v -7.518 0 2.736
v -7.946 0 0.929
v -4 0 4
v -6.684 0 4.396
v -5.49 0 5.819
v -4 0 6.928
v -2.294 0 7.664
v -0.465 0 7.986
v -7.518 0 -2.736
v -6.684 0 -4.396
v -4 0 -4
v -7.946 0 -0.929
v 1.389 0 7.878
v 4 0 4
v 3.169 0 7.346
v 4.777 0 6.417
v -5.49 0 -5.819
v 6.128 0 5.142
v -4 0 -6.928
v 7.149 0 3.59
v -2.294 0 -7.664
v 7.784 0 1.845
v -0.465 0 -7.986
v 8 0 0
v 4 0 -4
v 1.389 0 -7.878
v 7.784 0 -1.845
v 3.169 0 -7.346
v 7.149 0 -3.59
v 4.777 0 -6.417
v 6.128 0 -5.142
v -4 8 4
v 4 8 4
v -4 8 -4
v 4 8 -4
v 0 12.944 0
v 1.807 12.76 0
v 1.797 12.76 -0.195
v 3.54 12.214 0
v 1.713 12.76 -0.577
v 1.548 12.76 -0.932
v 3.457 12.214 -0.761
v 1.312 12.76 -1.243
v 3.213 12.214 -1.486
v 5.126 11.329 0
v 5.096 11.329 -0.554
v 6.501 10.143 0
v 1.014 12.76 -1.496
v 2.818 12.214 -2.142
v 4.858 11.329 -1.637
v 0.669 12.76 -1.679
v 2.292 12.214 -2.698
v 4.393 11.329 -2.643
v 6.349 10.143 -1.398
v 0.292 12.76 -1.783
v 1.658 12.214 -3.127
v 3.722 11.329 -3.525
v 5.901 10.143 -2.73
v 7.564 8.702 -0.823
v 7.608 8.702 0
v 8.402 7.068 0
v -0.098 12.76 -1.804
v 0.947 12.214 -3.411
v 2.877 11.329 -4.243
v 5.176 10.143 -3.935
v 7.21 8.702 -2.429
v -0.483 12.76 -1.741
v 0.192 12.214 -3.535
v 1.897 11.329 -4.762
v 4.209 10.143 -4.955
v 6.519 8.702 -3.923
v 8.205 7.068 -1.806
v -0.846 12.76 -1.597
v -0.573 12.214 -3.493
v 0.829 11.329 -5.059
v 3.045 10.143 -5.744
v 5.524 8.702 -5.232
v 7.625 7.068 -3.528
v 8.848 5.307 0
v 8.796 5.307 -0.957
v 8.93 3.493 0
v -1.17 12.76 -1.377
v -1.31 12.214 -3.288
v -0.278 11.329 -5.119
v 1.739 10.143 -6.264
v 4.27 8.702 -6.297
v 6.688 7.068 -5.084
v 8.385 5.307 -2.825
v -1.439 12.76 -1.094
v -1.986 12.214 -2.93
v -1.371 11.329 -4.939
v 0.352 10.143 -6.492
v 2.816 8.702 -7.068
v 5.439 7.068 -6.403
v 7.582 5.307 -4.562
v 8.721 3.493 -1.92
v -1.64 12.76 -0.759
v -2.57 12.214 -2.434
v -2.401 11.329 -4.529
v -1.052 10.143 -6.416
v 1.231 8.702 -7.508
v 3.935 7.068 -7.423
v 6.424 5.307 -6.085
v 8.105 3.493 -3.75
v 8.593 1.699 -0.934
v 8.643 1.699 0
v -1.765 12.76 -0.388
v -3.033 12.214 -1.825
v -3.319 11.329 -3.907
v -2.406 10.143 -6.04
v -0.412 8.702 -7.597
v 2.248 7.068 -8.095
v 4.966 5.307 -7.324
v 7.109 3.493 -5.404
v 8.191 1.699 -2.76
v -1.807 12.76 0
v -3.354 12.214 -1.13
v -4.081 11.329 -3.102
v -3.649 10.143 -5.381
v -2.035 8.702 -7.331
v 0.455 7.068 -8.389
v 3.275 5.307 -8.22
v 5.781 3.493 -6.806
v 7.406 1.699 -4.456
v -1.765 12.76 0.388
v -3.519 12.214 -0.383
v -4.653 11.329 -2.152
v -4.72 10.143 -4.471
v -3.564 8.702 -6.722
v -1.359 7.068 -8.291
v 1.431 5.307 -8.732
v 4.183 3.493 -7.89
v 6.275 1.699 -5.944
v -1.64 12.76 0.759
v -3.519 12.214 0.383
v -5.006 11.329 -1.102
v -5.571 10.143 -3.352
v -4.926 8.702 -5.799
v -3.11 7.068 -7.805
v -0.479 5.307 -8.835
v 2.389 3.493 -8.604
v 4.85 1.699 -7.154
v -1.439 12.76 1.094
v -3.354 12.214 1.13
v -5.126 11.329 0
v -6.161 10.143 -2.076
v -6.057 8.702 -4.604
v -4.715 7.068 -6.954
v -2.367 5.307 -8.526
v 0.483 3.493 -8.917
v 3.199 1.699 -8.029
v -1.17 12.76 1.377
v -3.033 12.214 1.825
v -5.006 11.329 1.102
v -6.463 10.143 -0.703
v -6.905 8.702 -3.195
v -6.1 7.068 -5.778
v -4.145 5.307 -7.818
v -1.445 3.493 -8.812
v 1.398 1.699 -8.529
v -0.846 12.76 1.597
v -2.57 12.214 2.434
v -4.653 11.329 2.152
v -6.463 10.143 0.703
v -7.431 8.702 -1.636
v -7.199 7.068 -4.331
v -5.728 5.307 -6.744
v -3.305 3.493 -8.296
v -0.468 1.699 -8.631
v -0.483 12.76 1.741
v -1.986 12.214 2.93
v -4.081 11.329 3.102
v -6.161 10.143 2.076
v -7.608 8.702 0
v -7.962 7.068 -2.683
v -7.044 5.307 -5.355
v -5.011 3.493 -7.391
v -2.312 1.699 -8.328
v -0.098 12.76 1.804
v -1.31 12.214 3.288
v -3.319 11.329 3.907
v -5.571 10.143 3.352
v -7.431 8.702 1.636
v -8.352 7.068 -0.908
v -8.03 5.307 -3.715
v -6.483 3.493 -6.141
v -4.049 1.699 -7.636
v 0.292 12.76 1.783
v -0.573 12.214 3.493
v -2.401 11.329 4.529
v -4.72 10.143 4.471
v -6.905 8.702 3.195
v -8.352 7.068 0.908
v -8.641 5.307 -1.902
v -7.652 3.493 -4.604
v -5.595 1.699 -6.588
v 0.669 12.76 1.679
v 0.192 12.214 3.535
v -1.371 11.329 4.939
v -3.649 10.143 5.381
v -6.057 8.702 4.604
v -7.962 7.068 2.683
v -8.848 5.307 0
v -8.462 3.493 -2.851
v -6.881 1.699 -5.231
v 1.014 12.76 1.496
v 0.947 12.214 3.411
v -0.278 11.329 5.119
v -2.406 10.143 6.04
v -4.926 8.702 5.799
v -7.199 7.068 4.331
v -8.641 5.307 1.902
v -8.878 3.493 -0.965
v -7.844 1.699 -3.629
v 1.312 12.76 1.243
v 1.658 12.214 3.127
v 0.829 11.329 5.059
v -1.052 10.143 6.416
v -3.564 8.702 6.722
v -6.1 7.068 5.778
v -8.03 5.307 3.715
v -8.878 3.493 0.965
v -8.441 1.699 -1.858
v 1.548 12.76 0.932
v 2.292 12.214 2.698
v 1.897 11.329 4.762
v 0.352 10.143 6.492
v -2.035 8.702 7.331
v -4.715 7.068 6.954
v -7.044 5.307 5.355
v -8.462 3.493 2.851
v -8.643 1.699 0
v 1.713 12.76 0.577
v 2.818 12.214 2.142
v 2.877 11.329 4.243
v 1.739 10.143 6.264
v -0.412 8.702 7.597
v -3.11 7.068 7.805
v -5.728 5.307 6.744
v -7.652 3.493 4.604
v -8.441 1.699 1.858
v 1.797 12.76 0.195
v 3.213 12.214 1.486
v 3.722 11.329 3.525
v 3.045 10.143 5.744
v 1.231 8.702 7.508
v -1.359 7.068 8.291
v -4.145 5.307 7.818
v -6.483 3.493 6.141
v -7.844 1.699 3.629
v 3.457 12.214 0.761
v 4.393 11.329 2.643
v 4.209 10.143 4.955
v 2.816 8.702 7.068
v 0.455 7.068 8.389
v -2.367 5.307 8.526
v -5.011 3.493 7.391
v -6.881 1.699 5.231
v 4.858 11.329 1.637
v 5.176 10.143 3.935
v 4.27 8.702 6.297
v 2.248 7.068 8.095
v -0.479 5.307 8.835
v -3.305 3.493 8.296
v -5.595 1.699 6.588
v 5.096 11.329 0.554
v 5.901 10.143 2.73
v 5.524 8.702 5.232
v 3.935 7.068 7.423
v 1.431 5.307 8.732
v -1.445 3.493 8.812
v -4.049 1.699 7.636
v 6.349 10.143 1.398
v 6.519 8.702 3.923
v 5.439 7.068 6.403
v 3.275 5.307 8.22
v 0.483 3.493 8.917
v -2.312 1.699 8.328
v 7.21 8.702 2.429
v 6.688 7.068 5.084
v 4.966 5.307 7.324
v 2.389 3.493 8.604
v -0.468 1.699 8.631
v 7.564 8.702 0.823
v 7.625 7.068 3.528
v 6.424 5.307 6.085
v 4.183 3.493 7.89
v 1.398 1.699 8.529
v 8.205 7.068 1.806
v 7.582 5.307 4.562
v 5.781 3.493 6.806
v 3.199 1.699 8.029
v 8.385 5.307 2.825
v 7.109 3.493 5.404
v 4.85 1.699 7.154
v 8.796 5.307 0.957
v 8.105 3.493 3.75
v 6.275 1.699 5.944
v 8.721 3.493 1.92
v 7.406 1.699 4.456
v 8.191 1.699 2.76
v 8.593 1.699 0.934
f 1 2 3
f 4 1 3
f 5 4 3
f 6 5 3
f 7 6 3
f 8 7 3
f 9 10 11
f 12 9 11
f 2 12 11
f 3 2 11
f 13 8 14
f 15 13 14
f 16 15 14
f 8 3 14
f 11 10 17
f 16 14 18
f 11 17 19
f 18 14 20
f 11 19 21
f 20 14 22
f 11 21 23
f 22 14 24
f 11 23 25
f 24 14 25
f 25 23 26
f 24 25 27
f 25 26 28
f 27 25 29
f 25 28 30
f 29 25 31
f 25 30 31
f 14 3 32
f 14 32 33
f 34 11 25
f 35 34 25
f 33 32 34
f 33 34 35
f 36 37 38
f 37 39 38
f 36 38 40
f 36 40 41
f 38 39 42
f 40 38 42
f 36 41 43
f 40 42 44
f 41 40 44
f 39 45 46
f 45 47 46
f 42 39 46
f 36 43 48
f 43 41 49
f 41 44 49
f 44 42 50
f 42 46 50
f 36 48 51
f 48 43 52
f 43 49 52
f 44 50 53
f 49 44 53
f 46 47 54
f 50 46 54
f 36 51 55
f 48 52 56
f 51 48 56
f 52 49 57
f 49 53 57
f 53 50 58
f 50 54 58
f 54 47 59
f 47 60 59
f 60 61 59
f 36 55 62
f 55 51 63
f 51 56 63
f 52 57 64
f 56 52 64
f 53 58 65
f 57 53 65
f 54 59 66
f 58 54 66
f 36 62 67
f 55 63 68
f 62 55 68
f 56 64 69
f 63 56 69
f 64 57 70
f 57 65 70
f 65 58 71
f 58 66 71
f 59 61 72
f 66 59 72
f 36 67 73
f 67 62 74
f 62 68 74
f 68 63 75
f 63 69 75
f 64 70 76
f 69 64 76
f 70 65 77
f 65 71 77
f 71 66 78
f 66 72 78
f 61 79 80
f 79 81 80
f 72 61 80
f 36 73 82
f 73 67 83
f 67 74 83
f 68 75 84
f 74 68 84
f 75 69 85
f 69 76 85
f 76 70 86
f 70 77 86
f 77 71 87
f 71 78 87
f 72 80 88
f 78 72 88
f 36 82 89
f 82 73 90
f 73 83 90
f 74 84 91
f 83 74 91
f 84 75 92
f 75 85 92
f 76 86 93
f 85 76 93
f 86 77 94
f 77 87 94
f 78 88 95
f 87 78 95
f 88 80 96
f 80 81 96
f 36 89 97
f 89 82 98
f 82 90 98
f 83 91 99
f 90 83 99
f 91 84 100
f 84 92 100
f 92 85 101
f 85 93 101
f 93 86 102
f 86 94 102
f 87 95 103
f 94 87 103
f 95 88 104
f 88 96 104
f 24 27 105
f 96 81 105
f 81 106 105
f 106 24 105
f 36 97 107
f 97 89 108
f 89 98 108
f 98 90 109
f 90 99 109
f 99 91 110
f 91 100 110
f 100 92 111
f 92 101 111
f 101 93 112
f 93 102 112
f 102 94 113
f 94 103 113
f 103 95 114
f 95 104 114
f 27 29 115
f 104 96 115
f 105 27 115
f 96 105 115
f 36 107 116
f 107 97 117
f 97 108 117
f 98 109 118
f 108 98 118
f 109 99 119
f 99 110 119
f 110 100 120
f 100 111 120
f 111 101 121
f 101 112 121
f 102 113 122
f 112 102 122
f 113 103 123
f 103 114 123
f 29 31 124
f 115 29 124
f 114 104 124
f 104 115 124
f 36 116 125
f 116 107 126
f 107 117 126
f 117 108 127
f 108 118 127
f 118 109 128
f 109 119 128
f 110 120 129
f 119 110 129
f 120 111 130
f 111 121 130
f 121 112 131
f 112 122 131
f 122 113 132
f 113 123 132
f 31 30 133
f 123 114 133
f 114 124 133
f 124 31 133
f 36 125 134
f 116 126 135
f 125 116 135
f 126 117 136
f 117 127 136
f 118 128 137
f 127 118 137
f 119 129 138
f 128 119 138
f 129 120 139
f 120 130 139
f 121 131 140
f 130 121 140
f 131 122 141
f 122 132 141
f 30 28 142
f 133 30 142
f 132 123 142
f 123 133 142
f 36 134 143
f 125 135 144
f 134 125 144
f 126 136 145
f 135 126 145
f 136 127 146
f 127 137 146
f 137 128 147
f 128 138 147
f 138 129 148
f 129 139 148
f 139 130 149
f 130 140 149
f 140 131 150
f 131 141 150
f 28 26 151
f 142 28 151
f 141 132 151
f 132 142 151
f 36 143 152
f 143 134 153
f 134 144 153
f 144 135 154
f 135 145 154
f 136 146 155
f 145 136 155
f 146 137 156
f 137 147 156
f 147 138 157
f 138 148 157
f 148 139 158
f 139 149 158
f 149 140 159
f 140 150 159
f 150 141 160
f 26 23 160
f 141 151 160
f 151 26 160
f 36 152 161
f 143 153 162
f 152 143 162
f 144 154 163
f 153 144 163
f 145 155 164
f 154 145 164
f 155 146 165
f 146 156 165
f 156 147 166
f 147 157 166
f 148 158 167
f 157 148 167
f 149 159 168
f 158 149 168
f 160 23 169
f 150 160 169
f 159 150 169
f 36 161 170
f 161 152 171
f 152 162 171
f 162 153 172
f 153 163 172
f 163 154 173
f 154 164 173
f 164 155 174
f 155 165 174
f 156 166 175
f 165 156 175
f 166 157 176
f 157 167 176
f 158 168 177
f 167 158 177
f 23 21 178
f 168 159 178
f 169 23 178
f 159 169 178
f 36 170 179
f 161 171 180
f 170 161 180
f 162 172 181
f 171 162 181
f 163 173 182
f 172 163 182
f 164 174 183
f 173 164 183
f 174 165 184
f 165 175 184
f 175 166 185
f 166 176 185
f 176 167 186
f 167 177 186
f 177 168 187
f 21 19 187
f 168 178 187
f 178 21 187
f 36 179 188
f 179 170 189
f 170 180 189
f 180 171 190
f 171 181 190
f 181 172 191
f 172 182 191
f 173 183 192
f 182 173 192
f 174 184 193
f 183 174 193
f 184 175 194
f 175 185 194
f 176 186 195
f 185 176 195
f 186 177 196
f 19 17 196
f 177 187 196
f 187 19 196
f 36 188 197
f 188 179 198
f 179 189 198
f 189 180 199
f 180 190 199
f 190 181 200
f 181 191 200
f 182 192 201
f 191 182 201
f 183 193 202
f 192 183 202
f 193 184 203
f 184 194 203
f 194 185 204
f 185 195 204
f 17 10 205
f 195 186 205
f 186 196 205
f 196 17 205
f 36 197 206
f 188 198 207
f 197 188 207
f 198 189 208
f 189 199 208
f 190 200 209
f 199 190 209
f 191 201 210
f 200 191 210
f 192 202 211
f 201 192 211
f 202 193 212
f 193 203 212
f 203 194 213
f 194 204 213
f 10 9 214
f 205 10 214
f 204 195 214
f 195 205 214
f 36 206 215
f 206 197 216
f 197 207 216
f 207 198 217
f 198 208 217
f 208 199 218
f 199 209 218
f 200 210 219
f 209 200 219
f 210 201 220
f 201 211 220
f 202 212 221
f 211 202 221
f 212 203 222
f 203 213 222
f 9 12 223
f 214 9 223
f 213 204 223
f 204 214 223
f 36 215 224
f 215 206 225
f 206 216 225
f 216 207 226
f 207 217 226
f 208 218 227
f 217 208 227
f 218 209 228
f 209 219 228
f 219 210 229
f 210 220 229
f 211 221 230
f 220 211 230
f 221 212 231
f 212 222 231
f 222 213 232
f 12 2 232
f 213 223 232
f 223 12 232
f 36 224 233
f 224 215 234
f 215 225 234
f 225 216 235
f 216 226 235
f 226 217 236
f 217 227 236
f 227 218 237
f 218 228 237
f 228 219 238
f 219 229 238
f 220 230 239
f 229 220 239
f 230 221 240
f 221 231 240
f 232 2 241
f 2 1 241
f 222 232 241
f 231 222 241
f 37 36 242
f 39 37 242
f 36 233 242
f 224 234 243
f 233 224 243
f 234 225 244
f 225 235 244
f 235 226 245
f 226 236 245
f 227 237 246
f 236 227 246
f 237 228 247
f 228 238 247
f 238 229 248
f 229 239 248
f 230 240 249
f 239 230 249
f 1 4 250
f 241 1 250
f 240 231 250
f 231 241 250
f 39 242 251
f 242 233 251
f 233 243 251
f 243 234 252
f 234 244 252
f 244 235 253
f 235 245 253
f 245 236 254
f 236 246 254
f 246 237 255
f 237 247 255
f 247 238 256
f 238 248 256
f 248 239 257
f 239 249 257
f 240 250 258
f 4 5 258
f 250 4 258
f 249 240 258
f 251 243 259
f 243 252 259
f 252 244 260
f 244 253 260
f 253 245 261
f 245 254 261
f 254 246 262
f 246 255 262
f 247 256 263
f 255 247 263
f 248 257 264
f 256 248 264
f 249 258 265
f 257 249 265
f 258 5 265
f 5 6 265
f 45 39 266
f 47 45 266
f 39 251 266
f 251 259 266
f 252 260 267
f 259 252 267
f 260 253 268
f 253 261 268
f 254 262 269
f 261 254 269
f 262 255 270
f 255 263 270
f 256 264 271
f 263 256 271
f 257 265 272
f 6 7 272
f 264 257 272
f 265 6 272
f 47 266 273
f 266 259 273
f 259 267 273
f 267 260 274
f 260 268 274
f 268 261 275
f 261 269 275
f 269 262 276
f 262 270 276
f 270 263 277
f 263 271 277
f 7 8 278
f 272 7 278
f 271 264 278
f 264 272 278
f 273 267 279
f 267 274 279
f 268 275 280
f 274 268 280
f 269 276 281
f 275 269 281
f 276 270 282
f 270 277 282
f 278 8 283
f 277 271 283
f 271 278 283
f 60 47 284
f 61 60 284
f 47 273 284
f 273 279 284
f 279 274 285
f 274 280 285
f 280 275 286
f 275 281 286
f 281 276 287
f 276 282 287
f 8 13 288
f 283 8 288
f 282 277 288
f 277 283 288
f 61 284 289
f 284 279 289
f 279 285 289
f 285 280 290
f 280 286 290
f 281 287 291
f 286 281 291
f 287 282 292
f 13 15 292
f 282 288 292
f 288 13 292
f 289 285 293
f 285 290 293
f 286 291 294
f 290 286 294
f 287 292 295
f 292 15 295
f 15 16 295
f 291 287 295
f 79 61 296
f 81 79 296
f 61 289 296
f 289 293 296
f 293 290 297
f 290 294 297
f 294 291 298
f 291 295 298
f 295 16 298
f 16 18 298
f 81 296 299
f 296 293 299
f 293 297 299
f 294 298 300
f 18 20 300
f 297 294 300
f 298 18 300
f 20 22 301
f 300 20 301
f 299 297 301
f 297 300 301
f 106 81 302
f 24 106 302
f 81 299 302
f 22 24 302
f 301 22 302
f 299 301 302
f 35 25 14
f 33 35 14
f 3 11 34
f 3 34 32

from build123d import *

# Parameters (mm, degrees)
SKETCH2_W          = 8
SKETCH2_H          = 8
CUT_EXTRUDE1_DEPTH = 8


with BuildPart() as part:
    # Sketch1 → Revolve1 (revolve)
    with BuildSketch(Plane.XY, mode=Mode.PRIVATE) as revolve1_sk:
        with BuildLine():
            Line((-8, 0), (0, 0))
            Line((0, 0), (0, 12.94427191))
            ThreePointArc((0, 12.94427191), (-7.60845213, 8.702282018), (-8, 0))
        make_face()
    revolve(revolve1_sk.sketch.rotate(Axis((0, 0, 0), (0, 1, 0)), 180), axis=Axis((0, 0, 0), (0, 1, 0)))

    # Sketch2 → Cut-Extrude1 (cut)
    with BuildSketch(Plane.XZ):
        Rectangle(SKETCH2_W, SKETCH2_H)
    extrude(amount=-CUT_EXTRUDE1_DEPTH, mode=Mode.SUBTRACT)


solid = part.part
